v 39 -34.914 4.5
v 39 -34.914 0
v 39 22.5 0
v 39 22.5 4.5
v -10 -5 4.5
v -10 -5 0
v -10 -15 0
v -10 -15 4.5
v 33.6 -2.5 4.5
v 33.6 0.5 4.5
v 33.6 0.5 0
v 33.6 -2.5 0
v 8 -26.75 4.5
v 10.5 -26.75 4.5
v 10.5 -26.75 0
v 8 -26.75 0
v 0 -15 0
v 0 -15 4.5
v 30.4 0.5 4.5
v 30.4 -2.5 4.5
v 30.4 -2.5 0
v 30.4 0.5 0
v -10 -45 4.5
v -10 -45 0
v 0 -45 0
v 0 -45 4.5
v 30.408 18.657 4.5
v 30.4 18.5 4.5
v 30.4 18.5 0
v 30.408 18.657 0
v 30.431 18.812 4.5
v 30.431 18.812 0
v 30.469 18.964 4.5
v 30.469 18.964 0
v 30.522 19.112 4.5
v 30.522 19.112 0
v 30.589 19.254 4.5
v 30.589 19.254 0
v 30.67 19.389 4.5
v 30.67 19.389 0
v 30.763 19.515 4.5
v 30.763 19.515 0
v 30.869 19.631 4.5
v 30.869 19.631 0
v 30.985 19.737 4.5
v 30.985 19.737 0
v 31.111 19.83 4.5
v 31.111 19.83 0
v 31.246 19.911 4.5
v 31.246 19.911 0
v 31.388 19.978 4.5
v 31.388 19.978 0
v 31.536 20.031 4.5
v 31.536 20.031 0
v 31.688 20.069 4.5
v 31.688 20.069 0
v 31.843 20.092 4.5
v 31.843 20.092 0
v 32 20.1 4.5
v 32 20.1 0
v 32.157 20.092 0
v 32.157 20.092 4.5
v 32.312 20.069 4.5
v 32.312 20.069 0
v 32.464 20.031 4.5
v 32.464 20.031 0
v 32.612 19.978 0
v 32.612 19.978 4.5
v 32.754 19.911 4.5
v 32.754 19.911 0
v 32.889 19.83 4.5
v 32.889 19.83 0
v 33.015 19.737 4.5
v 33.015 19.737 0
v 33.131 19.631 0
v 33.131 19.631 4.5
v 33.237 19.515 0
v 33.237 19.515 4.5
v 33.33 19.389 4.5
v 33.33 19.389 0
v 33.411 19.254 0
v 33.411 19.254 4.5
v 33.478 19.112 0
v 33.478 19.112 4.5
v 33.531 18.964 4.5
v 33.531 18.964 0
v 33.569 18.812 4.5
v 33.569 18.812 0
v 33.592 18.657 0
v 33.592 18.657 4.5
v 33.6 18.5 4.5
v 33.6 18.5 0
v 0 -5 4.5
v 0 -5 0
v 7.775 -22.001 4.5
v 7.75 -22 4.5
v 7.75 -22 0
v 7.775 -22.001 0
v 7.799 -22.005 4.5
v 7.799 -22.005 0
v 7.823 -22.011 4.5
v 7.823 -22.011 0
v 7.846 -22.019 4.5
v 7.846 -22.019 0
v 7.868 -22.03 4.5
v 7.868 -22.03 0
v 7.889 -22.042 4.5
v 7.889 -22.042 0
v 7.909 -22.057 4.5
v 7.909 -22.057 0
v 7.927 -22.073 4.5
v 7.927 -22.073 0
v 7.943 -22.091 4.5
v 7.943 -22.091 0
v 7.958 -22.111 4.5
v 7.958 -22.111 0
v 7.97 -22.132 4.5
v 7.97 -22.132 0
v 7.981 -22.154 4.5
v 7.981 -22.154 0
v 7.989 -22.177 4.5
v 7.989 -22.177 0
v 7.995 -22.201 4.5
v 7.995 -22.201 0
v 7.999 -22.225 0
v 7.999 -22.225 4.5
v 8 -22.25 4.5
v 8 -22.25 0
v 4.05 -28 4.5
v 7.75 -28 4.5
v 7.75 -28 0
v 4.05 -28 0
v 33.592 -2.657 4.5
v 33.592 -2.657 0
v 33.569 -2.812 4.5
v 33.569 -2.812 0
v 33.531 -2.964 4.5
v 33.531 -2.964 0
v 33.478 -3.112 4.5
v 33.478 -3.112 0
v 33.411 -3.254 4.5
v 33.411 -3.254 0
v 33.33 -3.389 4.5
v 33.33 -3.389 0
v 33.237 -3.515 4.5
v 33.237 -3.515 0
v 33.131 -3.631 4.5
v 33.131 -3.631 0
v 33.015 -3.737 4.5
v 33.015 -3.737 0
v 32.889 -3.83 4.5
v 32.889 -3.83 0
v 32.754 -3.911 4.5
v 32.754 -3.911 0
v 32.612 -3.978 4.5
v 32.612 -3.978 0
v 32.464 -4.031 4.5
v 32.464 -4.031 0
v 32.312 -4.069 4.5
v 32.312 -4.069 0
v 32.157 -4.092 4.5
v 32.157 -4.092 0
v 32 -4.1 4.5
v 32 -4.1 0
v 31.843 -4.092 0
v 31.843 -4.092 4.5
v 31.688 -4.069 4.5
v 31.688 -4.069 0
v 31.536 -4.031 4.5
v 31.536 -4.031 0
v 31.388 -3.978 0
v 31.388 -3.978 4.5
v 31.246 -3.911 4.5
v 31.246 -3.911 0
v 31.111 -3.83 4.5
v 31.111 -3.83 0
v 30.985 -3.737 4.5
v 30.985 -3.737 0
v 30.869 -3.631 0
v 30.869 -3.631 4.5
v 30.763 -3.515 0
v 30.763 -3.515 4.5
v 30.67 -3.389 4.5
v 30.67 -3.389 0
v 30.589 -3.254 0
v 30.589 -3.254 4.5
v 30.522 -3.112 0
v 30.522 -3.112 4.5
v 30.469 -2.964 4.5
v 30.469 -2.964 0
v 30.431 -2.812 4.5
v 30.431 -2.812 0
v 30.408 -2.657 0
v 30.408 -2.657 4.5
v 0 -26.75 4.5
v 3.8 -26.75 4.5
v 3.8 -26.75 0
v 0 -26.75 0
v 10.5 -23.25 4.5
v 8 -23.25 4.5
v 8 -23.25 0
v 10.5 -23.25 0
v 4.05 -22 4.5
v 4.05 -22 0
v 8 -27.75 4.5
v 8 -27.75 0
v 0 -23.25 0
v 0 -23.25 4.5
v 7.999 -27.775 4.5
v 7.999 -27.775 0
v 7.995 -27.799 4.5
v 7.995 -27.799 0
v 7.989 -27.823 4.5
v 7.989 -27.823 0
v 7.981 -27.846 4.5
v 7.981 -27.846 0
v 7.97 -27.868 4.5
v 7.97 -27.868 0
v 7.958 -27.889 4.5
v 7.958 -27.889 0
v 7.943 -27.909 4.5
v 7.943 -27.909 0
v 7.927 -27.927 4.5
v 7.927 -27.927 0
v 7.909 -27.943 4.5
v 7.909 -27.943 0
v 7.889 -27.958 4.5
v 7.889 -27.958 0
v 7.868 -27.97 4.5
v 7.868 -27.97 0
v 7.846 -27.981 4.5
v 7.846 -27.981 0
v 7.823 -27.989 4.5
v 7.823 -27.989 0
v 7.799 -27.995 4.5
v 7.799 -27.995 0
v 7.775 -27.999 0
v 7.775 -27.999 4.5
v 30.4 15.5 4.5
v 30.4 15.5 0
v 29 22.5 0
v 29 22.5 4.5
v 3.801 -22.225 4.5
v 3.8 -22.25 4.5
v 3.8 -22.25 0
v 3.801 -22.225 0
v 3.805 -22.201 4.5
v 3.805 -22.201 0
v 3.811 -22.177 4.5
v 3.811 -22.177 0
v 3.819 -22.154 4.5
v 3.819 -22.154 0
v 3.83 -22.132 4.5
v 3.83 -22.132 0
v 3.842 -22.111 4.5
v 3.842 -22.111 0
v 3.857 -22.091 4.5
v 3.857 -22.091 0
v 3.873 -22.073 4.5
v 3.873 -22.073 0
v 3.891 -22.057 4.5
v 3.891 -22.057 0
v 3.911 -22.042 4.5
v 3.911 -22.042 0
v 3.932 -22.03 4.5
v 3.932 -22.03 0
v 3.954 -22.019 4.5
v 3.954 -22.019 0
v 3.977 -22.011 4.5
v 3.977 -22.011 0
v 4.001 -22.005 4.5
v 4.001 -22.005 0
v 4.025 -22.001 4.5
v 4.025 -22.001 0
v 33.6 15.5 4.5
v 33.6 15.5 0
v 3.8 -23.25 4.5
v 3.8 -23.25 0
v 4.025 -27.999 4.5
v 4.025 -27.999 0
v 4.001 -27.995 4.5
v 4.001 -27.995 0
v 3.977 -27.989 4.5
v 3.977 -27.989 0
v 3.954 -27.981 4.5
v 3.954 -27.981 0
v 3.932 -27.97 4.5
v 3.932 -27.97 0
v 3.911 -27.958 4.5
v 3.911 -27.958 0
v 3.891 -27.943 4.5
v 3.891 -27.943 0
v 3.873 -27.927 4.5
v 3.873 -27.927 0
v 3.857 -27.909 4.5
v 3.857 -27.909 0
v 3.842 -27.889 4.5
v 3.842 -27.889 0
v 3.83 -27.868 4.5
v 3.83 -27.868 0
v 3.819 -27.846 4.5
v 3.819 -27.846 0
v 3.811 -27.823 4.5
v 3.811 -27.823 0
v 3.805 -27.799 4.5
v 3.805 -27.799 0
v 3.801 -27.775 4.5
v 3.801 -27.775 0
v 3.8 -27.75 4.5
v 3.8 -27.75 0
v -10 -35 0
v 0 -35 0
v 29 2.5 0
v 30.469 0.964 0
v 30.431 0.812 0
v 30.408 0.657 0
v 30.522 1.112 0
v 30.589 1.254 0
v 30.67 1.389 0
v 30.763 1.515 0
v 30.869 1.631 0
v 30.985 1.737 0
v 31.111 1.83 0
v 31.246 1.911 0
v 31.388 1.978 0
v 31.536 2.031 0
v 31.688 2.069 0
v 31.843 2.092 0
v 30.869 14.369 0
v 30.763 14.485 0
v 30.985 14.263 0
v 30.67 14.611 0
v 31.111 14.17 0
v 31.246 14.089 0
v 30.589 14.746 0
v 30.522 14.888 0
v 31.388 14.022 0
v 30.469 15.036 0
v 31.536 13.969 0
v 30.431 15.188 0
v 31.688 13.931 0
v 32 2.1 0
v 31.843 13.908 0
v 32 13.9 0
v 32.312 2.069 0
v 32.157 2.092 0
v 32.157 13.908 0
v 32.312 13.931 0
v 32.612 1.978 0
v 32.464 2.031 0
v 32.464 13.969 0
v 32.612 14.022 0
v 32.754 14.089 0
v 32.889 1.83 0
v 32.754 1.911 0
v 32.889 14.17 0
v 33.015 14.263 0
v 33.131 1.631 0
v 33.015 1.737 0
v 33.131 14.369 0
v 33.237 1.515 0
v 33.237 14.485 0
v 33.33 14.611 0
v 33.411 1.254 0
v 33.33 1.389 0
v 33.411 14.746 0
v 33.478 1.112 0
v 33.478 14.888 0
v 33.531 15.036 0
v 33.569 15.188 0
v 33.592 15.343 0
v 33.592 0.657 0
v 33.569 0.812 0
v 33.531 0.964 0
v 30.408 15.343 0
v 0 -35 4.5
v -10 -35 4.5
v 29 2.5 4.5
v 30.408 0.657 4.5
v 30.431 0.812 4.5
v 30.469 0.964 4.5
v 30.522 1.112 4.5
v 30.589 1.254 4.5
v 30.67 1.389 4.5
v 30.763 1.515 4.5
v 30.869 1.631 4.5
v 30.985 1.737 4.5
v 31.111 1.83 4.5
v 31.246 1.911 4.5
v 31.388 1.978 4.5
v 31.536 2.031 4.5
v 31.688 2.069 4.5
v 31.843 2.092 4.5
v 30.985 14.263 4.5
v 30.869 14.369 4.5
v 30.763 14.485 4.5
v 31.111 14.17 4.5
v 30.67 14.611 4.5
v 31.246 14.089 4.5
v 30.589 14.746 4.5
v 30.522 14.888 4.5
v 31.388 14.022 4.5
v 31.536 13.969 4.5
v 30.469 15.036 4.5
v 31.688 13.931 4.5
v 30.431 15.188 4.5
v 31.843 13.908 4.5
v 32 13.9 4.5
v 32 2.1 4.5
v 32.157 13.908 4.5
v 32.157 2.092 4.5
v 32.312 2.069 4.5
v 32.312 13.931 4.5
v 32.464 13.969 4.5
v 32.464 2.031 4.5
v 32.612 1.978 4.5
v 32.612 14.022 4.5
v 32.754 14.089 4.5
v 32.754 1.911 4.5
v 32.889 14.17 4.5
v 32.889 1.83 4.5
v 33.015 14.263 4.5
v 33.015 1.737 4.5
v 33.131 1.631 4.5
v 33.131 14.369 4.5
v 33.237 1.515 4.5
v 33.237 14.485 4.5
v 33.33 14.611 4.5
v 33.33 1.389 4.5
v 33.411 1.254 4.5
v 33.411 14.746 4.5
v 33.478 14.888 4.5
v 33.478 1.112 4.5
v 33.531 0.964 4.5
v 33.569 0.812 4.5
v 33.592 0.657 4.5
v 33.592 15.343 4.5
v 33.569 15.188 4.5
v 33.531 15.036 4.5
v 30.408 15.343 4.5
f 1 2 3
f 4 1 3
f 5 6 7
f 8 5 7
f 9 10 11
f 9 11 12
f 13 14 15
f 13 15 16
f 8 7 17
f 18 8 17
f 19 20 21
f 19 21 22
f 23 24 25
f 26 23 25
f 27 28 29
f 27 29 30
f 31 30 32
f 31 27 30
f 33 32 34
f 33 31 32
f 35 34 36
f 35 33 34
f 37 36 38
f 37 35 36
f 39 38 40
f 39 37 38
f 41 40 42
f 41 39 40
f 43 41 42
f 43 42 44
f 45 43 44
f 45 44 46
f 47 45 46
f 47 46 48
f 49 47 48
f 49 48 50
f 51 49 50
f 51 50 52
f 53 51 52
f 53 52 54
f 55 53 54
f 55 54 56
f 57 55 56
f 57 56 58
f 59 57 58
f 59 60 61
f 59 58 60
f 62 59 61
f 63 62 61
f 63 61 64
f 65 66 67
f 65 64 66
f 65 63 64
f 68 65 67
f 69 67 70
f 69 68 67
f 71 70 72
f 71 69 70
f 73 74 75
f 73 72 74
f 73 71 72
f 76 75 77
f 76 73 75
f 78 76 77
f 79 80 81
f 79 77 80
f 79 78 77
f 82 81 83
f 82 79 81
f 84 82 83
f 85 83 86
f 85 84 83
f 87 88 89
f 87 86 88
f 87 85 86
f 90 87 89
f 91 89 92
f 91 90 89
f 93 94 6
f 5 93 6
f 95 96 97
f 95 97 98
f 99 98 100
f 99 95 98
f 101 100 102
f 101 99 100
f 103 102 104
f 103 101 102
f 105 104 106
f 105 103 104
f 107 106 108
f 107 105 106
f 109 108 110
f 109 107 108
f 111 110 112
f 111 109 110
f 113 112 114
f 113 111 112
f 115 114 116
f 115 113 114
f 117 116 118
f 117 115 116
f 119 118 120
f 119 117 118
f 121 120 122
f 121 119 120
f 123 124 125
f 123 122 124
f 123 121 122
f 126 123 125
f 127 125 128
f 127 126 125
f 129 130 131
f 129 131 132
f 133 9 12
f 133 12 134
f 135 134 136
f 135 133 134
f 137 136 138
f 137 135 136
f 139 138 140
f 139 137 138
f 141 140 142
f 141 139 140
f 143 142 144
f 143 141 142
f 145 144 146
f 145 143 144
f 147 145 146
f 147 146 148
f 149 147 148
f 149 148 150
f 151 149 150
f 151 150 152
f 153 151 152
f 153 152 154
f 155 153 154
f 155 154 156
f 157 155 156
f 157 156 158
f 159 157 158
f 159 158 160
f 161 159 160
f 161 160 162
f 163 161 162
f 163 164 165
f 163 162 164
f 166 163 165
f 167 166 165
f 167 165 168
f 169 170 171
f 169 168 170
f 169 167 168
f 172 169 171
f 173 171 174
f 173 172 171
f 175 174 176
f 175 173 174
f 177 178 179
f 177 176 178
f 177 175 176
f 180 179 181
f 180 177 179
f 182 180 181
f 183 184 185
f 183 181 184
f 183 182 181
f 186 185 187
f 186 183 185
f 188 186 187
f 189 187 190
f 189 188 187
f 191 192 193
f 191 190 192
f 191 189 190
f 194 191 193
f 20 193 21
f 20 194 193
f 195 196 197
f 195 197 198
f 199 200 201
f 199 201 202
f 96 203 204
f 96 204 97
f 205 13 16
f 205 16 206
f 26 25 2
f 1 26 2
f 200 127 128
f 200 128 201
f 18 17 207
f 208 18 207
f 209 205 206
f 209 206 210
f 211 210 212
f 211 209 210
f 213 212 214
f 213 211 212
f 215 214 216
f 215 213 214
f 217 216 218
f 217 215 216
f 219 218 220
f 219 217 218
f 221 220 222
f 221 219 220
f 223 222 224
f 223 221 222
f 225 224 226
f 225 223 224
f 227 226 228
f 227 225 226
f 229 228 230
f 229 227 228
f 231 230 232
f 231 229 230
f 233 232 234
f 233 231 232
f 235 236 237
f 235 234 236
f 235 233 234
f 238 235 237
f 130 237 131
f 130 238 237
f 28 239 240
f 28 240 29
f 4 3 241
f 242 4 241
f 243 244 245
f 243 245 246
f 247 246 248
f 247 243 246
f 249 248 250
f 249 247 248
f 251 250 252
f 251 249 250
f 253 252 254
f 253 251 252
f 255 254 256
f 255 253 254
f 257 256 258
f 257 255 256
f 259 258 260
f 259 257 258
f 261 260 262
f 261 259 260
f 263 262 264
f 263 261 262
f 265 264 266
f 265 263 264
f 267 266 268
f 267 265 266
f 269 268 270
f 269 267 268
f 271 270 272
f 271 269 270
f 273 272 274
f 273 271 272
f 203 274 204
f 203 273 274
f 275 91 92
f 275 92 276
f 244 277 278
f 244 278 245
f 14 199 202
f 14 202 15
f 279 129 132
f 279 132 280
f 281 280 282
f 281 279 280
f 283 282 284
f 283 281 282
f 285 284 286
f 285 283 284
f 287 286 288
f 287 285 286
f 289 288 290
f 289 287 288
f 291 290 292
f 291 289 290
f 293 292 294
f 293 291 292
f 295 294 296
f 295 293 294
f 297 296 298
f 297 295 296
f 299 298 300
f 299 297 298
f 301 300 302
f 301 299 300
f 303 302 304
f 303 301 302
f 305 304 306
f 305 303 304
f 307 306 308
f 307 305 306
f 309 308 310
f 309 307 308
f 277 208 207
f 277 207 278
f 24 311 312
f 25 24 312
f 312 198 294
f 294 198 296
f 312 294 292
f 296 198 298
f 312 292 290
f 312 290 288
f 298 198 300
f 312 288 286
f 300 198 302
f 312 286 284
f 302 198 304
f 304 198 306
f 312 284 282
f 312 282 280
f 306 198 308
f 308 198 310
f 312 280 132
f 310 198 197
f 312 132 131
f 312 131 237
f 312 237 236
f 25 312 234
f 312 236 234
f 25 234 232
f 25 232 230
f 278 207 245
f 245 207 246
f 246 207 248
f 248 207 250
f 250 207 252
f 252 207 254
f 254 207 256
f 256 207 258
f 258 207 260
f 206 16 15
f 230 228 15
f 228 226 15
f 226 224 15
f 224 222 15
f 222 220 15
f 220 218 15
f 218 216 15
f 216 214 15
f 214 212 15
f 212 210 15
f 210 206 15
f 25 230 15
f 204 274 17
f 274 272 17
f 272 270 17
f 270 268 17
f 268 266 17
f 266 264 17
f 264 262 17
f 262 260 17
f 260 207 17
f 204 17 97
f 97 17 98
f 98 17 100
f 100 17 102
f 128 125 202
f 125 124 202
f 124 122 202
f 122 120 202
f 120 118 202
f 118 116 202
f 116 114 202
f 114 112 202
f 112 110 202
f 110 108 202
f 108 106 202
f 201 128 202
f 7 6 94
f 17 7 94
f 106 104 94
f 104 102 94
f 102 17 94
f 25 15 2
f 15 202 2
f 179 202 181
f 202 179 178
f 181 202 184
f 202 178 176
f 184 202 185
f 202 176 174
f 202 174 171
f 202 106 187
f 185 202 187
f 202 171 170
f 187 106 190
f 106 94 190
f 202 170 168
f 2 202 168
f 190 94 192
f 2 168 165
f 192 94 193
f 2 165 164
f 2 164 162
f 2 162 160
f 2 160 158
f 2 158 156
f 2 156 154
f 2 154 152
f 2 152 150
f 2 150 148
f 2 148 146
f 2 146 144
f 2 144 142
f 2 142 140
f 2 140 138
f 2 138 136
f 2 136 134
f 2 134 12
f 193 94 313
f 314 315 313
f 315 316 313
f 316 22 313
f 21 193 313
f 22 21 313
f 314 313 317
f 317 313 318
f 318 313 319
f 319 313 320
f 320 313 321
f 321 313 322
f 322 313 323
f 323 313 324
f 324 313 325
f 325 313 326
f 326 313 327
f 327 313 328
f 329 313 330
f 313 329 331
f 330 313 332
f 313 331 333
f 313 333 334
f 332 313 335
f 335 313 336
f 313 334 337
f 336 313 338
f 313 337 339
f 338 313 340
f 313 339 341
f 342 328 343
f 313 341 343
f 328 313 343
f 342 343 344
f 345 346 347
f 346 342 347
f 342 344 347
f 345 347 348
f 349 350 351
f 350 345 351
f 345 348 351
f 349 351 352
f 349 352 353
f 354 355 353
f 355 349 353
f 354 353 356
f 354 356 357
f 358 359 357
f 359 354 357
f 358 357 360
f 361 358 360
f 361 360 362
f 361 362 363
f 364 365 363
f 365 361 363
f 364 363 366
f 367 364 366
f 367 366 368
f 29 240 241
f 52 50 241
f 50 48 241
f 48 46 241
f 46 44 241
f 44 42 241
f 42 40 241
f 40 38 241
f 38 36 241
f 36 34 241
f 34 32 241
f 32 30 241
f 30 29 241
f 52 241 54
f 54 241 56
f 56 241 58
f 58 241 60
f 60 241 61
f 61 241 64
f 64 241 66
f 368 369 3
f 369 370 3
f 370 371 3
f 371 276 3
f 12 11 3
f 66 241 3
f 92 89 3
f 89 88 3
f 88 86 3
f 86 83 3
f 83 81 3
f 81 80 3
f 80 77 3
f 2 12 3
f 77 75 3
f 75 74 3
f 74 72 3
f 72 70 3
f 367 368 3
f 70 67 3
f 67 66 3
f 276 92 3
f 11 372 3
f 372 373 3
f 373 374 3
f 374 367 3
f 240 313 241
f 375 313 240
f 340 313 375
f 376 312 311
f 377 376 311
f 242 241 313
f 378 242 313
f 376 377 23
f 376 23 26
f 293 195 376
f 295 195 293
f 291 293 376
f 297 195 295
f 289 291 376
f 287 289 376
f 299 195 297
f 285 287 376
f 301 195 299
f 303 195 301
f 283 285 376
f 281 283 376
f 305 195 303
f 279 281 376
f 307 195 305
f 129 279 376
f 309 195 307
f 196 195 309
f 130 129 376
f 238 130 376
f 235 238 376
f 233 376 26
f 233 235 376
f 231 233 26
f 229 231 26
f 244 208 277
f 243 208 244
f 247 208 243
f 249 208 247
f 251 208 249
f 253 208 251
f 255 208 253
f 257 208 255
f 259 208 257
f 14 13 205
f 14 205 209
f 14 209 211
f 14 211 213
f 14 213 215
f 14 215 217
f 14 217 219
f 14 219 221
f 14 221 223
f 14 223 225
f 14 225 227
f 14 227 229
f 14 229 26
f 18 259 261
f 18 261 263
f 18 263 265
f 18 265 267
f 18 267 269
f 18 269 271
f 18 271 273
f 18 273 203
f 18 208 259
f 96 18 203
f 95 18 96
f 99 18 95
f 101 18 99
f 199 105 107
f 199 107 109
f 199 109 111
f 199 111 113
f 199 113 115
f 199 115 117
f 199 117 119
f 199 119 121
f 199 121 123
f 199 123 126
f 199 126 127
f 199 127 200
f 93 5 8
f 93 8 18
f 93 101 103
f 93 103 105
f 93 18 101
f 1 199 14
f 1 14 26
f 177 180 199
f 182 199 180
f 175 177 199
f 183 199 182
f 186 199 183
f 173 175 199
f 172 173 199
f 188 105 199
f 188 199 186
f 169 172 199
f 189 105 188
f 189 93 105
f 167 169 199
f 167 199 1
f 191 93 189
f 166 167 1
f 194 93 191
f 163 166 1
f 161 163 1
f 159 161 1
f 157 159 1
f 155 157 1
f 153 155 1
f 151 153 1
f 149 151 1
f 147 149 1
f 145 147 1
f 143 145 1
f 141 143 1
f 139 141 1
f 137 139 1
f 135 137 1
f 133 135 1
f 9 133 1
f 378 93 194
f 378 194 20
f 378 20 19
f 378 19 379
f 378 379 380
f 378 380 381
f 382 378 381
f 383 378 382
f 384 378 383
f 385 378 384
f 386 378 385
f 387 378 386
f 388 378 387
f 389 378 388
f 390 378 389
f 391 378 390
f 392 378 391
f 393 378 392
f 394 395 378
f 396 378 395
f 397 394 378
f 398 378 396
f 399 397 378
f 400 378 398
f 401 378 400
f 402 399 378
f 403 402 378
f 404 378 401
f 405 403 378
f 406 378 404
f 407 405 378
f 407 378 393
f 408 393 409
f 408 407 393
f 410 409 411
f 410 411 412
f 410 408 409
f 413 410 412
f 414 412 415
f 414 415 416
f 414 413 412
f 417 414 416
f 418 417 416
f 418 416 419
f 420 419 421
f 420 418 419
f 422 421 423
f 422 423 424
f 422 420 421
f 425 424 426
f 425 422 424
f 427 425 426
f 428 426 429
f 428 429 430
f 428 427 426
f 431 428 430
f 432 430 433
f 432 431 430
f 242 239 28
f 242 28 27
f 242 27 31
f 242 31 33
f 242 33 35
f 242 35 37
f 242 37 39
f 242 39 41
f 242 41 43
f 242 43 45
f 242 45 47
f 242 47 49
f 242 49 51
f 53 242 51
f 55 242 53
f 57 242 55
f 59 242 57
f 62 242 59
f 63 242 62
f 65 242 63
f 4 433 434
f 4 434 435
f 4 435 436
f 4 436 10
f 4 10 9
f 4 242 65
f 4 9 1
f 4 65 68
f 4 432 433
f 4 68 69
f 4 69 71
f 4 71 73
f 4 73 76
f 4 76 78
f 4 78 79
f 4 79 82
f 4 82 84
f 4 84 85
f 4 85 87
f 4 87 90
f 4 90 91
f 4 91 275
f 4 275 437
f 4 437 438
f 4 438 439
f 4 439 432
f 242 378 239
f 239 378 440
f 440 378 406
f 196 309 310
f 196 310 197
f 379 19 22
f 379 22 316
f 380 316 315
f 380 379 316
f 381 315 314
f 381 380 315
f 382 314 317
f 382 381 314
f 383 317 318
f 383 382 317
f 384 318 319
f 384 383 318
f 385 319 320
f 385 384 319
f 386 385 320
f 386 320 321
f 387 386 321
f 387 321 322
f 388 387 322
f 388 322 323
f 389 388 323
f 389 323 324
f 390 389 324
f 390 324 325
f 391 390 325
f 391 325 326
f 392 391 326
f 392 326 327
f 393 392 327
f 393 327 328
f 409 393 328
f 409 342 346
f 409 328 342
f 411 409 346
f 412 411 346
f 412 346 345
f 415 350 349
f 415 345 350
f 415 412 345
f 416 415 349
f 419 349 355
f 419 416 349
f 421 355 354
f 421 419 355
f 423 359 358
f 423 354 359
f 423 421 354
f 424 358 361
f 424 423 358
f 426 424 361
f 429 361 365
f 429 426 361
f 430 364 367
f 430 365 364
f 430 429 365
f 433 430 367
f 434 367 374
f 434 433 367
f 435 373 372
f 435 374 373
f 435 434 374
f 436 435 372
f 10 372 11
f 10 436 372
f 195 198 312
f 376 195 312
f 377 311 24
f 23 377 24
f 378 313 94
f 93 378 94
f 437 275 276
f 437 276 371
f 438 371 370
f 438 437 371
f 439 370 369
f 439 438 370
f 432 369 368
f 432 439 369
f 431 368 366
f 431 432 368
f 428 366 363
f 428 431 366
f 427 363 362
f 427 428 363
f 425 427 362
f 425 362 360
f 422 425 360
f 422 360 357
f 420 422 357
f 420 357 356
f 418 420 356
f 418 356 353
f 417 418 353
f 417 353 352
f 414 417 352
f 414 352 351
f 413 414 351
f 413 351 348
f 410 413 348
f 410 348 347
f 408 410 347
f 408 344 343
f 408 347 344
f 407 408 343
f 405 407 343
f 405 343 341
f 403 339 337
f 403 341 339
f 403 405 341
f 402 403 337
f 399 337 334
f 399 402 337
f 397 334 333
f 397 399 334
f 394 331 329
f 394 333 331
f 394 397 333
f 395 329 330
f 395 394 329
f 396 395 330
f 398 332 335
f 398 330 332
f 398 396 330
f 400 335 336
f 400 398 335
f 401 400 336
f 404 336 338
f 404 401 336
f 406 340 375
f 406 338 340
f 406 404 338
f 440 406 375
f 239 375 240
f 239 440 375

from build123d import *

# Parameters (mm, degrees)
BOSS_EXTRUDE1_DEPTH = 4.5
SCREW_CUTOUT_DEPTH  = 60.718087712
CUT_EXTRUDE2_DEPTH  = 60.718087712


with BuildPart() as part:
    # Sketch1 → Boss-Extrude1 (new body)
    with BuildSketch(Plane.XY):
        Polygon((29, 2.5), (0, -5), (-10, -5), (-10, -15), (0, -15), (0, -35), (-10, -35), (-10, -45), (0, -45), (39, -34.913793103), (39, 22.5), (29, 22.5), align=None)
    extrude(amount=BOSS_EXTRUDE1_DEPTH)

    # Sketch2 → screw-cutout (cut, through all)
    with BuildSketch(Plane.XY.offset(4.5)):
        with BuildLine():
            Line((0, -26.75), (0, -23.25))
            Line((0, -23.25), (3.8, -23.25))
            Line((3.8, -23.25), (3.8, -22.25))
            ThreePointArc((3.8, -22.25), (3.873223305, -22.073223305), (4.05, -22))
            Line((4.05, -22), (7.75, -22))
            ThreePointArc((7.75, -22), (7.926776695, -22.073223305), (8, -22.25))
            Line((8, -22.25), (8, -23.25))
            Line((8, -23.25), (10.5, -23.25))
            Line((10.5, -23.25), (10.5, -26.75))
            Line((10.5, -26.75), (8, -26.75))
            Line((8, -26.75), (8, -27.75))
            ThreePointArc((8, -27.75), (7.926776695, -27.926776695), (7.75, -28))
            Line((7.75, -28), (4.05, -28))
            ThreePointArc((4.05, -28), (3.873223305, -27.926776695), (3.8, -27.75))
            Line((3.8, -27.75), (3.8, -26.75))
            Line((3.8, -26.75), (0, -26.75))
        make_face()
    extrude(amount=-SCREW_CUTOUT_DEPTH, mode=Mode.SUBTRACT)

    # Sketch3 → Cut-Extrude2 (cut, through all)
    with BuildSketch(Plane.XY.offset(4.5)):
        with BuildLine():
            Line((33.6, 18.5), (33.6, 15.5))
            ThreePointArc((33.6, 15.5), (32, 13.9), (30.4, 15.5))
            Line((30.4, 15.5), (30.4, 18.5))
            ThreePointArc((30.4, 18.5), (32, 20.1), (33.6, 18.5))
        make_face()
        with BuildLine():
            Line((33.6, 0.5), (33.6, -2.5))
            ThreePointArc((33.6, -2.5), (32, -4.1), (30.4, -2.5))
            Line((30.4, -2.5), (30.4, 0.5))
            ThreePointArc((30.4, 0.5), (32, 2.1), (33.6, 0.5))
        make_face()
    extrude(amount=-CUT_EXTRUDE2_DEPTH, mode=Mode.SUBTRACT)


solid = part.part
